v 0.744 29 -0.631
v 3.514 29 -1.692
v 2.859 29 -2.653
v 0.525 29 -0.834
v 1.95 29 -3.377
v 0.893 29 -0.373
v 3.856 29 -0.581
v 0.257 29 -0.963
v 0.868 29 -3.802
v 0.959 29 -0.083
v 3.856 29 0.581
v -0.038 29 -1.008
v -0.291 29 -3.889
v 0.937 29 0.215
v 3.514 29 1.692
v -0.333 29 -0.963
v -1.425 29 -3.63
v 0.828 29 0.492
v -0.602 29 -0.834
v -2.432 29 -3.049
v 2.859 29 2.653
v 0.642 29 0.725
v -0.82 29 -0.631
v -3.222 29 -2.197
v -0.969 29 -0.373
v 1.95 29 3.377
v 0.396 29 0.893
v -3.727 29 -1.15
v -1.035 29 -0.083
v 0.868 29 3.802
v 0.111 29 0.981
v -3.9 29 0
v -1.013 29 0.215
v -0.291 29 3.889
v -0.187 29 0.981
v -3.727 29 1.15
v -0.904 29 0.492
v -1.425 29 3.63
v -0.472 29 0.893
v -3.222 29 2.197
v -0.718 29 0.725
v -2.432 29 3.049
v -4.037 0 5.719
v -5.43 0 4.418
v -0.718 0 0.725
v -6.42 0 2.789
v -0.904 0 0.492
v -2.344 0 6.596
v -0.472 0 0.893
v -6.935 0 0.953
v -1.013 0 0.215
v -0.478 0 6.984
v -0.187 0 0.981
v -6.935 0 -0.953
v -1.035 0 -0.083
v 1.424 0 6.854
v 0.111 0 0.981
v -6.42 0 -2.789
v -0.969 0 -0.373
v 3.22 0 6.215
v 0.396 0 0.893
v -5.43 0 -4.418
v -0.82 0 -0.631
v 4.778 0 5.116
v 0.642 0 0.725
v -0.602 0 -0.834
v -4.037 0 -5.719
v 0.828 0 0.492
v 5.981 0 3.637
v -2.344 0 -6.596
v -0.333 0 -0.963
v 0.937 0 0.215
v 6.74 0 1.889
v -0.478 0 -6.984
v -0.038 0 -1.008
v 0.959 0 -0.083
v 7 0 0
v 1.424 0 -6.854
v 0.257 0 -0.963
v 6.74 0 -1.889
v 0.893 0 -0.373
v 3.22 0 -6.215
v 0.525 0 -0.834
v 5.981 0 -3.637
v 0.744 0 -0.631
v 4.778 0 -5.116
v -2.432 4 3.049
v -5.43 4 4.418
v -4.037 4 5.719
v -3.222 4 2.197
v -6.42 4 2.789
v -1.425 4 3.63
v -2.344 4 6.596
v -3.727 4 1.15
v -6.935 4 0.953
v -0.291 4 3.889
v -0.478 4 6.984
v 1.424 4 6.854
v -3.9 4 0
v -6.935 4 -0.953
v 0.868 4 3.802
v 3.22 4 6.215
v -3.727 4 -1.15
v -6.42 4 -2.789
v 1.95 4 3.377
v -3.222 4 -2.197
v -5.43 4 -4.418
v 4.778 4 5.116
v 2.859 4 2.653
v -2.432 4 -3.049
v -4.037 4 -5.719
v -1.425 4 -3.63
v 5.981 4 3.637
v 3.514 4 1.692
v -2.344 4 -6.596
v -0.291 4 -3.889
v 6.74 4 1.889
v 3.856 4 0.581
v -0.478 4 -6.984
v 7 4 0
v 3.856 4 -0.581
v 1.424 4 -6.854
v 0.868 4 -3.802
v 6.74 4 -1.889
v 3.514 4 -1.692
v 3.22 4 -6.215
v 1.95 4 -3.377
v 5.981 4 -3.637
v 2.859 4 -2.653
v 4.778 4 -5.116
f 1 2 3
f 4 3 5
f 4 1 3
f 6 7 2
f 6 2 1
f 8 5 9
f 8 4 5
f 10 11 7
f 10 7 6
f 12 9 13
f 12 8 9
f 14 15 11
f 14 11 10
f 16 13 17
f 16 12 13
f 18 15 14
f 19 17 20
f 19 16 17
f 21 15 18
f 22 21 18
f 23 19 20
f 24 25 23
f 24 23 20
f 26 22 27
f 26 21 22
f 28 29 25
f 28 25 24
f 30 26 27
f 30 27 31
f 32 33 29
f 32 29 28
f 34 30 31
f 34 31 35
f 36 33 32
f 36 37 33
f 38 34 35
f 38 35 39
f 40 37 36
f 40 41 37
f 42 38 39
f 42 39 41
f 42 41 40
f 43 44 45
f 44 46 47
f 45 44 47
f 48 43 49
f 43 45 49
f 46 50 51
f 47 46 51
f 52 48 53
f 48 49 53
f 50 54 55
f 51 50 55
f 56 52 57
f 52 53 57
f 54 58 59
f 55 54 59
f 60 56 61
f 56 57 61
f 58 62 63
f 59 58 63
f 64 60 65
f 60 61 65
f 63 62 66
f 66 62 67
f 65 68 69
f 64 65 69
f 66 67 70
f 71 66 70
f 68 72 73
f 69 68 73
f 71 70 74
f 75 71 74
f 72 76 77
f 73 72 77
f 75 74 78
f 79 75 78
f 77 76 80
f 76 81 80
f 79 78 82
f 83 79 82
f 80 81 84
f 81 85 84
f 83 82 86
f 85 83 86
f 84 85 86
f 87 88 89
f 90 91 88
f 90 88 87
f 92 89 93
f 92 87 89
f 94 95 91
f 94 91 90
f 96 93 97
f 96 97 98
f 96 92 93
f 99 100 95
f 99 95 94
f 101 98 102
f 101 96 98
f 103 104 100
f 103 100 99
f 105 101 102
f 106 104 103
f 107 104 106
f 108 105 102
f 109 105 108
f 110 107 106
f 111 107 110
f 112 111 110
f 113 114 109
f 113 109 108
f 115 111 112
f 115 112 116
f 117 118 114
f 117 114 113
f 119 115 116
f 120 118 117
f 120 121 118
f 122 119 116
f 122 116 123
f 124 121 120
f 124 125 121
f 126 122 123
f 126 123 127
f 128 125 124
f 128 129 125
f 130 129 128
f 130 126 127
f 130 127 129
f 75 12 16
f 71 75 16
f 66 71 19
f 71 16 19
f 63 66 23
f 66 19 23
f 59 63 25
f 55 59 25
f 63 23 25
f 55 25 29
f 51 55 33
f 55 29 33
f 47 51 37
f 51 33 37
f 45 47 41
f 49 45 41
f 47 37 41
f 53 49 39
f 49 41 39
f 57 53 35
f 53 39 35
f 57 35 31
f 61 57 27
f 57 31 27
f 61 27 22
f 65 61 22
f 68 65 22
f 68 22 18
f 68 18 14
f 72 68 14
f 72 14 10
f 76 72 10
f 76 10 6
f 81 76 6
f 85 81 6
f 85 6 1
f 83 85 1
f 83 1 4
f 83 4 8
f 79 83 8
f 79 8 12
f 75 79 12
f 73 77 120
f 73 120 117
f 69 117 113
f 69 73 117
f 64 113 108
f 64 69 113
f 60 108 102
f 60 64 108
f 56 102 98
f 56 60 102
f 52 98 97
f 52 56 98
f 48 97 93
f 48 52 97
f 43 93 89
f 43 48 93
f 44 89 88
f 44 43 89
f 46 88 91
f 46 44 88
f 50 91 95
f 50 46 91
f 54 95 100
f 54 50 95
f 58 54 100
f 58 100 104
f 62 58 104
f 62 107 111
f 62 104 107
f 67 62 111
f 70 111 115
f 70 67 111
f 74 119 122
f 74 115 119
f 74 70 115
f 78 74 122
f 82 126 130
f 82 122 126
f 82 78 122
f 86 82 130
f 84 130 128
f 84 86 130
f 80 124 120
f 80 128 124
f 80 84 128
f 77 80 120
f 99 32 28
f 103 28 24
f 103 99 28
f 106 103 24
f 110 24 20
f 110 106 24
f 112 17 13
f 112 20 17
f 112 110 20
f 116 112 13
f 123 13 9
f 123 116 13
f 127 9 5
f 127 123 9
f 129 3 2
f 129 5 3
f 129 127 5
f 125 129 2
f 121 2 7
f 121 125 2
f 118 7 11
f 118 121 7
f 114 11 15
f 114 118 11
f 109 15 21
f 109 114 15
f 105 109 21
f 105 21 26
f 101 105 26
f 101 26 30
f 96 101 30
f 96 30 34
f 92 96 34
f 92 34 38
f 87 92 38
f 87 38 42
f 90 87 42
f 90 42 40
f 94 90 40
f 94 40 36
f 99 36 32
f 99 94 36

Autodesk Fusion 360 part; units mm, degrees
sketch "Base" plane through (0, 0, 0) normal (0, 1, 0) x (1, 0, 0)
  circle A0 centre (0, 0) radius 7
  dimension "d1" = 14
extrude "Extrude1" add sketch "Base" along normal blind 4
sketch "Pin" plane through (0, 4, 0) normal (0, 1, 0) x (-1, 0, 0)
  circle A0 centre (0, 0) radius 7
  circle A1 centre (0, 0) radius 3.9
  dimension "d4" = 7.8
extrude "Extrude2" add sketch "Pin" along normal blind 25 contours A1
hole "Hole1" at (-0.0382, 0, -0.0078) direction (0, 1, 0) diameter 2 end through all
